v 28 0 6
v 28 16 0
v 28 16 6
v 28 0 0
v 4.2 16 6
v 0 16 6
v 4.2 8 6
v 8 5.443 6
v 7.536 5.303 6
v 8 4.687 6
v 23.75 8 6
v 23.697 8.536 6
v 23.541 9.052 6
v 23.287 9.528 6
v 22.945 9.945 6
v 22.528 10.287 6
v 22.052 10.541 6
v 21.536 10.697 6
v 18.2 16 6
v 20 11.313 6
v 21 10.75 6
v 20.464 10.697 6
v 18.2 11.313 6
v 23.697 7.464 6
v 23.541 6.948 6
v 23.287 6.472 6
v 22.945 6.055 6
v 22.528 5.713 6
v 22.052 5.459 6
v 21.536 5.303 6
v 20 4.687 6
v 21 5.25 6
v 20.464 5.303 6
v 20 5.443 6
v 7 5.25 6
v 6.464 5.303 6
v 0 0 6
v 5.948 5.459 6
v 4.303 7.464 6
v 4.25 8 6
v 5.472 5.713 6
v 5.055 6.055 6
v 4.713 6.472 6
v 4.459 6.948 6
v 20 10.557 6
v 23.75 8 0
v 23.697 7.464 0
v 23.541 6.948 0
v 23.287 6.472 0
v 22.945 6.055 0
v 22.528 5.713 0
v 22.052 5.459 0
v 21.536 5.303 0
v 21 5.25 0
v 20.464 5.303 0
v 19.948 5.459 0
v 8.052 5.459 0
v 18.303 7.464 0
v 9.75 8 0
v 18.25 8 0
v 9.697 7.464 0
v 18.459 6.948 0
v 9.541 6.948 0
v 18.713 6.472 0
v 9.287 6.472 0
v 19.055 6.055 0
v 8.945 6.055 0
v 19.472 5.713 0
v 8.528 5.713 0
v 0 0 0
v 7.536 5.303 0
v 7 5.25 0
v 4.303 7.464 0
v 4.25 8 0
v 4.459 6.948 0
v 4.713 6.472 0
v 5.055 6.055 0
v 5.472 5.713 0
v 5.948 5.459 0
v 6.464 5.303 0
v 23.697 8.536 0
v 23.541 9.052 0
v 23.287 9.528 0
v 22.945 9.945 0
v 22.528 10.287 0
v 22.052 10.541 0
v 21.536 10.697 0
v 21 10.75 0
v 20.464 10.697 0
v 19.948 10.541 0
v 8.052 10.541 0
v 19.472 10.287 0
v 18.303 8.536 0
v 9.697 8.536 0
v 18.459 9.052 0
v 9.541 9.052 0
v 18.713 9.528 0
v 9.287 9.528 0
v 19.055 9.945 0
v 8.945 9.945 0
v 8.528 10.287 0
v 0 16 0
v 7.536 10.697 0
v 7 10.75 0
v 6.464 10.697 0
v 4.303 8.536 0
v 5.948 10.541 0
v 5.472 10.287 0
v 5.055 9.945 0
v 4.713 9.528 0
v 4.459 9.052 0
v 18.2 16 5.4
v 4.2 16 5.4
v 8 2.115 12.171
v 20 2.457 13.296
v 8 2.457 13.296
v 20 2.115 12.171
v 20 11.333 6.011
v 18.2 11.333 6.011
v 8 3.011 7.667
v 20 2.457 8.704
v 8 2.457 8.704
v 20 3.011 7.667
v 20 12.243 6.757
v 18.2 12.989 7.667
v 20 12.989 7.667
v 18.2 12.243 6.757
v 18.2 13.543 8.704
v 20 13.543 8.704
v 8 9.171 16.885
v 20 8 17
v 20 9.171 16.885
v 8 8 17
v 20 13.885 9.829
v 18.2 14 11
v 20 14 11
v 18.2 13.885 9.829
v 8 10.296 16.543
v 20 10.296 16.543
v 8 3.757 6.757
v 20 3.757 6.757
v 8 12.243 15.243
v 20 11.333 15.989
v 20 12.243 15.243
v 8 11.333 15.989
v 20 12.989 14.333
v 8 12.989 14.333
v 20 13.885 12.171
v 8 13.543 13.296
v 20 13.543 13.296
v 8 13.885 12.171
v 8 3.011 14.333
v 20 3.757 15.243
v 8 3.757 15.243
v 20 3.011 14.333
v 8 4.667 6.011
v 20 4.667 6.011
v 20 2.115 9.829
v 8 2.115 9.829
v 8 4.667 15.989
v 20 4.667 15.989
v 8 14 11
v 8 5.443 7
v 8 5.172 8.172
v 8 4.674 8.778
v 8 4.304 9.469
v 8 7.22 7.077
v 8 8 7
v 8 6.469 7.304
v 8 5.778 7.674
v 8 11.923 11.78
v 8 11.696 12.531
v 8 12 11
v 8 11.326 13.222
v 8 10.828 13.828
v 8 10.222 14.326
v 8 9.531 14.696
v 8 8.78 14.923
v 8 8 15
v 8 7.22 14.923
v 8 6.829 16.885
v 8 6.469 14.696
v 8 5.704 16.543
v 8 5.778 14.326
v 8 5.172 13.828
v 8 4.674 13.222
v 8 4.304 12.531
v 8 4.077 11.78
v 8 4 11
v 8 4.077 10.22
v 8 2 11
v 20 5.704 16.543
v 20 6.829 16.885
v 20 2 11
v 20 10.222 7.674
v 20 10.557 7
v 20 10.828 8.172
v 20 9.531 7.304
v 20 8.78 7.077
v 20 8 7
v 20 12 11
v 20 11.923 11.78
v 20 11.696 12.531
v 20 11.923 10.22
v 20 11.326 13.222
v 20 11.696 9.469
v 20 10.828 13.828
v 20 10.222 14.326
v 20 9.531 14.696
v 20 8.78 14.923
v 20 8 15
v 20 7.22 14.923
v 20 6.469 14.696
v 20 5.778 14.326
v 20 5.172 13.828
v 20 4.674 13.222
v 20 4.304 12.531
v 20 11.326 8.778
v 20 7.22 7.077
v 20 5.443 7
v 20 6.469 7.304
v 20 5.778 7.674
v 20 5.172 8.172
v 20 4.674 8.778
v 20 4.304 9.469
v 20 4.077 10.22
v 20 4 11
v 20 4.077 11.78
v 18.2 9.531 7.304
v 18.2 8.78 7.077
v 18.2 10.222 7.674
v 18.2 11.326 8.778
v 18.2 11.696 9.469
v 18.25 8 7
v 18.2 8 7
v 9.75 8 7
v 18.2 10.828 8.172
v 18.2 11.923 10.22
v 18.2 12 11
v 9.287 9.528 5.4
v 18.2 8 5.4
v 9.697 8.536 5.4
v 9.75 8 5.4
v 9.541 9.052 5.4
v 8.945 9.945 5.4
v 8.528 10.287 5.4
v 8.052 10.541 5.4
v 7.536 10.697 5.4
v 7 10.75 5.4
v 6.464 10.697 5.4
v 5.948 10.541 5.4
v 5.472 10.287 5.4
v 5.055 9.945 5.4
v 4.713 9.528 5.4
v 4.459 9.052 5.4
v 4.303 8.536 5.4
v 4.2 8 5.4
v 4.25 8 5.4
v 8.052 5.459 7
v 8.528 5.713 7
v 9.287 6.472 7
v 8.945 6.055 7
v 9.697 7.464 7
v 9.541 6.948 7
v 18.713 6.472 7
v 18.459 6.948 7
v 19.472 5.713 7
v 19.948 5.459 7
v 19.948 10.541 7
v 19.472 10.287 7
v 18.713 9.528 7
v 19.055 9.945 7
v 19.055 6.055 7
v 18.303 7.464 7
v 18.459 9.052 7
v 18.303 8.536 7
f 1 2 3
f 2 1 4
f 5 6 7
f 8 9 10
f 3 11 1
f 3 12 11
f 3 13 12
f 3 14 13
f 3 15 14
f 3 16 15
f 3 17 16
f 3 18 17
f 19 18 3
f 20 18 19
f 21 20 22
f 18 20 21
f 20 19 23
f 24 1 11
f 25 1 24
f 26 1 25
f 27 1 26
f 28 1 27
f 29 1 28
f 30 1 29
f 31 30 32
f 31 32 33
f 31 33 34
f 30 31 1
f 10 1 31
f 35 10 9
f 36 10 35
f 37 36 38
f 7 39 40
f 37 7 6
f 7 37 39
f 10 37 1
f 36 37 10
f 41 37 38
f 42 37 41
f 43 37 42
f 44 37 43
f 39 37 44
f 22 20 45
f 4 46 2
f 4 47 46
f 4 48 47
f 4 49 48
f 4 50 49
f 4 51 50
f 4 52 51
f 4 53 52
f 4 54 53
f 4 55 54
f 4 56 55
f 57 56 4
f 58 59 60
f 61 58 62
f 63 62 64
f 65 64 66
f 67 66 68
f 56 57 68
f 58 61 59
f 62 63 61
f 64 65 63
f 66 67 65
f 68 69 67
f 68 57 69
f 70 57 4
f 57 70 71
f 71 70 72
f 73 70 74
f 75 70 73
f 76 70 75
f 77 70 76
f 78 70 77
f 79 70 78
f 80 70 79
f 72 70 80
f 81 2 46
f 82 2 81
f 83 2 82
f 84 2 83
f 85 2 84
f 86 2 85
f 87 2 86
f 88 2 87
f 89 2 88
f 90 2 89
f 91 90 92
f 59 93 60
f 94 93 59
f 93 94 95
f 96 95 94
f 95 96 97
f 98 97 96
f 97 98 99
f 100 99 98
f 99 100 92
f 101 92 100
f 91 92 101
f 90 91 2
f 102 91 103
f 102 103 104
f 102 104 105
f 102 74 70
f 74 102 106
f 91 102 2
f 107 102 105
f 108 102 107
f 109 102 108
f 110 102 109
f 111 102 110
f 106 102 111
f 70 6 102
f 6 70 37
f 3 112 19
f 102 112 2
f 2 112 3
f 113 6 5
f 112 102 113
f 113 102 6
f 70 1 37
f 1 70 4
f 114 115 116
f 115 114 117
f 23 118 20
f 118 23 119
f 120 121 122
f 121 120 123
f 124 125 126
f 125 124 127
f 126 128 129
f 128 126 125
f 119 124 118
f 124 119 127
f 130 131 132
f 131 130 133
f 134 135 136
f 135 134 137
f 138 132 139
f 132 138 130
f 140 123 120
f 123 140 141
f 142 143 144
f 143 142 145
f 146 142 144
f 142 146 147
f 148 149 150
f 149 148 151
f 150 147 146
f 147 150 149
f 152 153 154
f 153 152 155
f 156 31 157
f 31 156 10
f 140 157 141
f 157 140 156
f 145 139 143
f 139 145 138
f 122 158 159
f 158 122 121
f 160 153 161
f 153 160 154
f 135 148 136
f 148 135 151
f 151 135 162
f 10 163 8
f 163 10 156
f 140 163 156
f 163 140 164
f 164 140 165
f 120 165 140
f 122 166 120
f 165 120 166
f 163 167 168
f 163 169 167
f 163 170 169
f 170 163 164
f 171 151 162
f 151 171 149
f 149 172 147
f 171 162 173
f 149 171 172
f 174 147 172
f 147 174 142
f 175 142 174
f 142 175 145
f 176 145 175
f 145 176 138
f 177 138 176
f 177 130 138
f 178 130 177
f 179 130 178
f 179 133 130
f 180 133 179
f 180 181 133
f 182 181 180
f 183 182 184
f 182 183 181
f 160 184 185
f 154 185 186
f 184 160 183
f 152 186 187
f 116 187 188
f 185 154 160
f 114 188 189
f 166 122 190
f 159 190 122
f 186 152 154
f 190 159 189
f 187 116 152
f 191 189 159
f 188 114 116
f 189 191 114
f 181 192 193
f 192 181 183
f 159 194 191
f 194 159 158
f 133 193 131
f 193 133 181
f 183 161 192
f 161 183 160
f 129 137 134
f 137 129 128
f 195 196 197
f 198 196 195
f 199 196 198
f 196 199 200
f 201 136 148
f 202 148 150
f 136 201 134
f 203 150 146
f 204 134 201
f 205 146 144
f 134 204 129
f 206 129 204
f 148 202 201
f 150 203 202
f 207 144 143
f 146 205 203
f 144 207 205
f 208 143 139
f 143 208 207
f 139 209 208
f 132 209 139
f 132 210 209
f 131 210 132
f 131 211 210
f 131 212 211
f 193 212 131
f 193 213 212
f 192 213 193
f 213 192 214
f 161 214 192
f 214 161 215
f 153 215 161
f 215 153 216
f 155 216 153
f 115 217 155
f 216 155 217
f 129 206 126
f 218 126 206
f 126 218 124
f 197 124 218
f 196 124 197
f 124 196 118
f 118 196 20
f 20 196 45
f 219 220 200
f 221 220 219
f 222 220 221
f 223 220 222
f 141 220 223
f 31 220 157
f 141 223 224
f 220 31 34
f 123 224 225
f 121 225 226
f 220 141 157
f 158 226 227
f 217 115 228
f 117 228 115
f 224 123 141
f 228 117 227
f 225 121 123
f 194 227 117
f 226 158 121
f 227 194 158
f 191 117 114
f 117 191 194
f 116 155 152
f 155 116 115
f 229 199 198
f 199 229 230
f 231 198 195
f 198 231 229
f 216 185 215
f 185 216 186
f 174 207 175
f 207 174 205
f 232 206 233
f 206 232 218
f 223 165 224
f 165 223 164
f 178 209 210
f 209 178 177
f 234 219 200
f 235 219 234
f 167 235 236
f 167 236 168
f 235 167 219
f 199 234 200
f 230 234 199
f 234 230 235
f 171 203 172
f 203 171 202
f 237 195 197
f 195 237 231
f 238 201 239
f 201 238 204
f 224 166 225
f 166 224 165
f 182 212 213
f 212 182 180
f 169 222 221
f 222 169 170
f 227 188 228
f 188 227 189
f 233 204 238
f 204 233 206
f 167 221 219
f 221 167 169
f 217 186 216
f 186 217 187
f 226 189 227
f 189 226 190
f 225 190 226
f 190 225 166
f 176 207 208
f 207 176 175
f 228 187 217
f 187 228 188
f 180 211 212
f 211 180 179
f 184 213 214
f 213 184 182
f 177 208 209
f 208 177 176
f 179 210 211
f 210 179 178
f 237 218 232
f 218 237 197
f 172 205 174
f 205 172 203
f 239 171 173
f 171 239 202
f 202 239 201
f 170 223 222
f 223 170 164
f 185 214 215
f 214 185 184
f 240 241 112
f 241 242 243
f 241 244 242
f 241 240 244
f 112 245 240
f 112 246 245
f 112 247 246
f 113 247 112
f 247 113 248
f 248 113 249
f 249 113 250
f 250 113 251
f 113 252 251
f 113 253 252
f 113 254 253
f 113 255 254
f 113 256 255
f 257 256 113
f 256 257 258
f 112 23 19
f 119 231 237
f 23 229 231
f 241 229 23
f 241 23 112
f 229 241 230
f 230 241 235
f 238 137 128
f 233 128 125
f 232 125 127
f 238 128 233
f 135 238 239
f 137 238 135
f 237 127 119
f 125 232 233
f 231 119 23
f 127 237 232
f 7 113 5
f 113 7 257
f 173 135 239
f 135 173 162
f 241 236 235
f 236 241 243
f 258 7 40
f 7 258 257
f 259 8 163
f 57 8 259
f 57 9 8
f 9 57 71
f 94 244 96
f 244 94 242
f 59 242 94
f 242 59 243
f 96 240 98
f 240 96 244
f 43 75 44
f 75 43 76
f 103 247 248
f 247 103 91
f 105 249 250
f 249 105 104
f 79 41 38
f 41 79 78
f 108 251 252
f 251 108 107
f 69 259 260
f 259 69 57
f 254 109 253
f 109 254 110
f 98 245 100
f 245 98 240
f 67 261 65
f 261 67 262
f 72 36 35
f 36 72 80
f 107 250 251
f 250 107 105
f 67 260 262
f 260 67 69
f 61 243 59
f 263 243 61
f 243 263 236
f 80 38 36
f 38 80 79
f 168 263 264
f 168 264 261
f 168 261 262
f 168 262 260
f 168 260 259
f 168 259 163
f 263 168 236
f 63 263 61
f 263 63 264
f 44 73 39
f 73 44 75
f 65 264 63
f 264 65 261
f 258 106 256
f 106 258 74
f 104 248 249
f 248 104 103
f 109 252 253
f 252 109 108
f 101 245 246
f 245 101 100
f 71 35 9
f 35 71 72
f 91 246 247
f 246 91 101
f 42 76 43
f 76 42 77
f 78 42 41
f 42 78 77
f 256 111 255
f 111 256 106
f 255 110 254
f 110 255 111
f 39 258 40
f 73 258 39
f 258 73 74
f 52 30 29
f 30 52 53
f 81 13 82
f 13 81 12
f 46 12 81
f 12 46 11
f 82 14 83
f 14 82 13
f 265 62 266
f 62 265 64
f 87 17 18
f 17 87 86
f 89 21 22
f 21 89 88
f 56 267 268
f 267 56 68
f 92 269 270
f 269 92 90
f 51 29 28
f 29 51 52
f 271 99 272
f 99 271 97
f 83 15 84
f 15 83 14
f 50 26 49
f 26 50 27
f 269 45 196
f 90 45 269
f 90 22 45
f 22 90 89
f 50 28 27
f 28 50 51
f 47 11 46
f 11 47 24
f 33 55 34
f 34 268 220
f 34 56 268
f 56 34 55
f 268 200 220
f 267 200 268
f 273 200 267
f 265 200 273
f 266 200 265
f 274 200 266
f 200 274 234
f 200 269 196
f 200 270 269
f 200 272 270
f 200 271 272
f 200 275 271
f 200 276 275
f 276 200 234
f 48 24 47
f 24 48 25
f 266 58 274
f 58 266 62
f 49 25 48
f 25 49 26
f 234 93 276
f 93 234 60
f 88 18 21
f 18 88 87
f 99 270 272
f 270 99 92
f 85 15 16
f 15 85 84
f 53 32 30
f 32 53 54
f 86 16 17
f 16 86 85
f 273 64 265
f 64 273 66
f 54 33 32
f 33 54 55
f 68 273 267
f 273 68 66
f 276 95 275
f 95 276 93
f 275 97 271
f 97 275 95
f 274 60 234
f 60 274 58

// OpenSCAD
$fn = 32;

// ----------------------------------------------------------------------
// Cable clip: cable 8 mm, clamp 12 mm, base 28 mm
// ----------------------------------------------------------------------

// --- parameters (mm) ---
base_w = 28;              // base length, X
base_d = 16;              // base width, Y
base_t = 6;               // base thickness
clamp_d = 12;             // clamp outside diameter
wall_t = 2;               // clamp wall
cable_d = 8;              // cable opening
ring_w = 12;              // clamp width along the cable
screw_d = 5.5;            // screw clearance
throat = 5.6;             // snap throat width
sink = 1;                 // overlap of the clamp into the base

module base() {
  cube([base_w, base_d, base_t]);
}

module clamp() {
  translate([base_w / 2, base_d / 2, base_t + clamp_d / 2 - sink]) rotate([0, 90, 0])
    cylinder(h = ring_w, d = clamp_d, center = true);
}

difference() {
  union() {
    base();
    clamp();
  }
  translate([base_w / 2, base_d / 2, base_t + clamp_d / 2 - sink]) rotate([0, 90, 0]) translate([0, 0, -ring_w / 2 - 1]) cylinder(h = ring_w + 2, d = cable_d);
  /* snap throat: the opening is narrower than the cable */
  translate([base_w / 2 - throat / 2, base_d / 2, base_t + clamp_d / 2 - sink]) rotate([0, 90, 0]) translate([0, 0, -ring_w / 2 - 1]) cube([throat, clamp_d + 2, ring_w + 2]);
  translate([7, base_d / 2, -1]) cylinder(h = base_t + 2, d = screw_d);
  translate([21, base_d / 2, -1]) cylinder(h = base_t + 2, d = screw_d);
}
